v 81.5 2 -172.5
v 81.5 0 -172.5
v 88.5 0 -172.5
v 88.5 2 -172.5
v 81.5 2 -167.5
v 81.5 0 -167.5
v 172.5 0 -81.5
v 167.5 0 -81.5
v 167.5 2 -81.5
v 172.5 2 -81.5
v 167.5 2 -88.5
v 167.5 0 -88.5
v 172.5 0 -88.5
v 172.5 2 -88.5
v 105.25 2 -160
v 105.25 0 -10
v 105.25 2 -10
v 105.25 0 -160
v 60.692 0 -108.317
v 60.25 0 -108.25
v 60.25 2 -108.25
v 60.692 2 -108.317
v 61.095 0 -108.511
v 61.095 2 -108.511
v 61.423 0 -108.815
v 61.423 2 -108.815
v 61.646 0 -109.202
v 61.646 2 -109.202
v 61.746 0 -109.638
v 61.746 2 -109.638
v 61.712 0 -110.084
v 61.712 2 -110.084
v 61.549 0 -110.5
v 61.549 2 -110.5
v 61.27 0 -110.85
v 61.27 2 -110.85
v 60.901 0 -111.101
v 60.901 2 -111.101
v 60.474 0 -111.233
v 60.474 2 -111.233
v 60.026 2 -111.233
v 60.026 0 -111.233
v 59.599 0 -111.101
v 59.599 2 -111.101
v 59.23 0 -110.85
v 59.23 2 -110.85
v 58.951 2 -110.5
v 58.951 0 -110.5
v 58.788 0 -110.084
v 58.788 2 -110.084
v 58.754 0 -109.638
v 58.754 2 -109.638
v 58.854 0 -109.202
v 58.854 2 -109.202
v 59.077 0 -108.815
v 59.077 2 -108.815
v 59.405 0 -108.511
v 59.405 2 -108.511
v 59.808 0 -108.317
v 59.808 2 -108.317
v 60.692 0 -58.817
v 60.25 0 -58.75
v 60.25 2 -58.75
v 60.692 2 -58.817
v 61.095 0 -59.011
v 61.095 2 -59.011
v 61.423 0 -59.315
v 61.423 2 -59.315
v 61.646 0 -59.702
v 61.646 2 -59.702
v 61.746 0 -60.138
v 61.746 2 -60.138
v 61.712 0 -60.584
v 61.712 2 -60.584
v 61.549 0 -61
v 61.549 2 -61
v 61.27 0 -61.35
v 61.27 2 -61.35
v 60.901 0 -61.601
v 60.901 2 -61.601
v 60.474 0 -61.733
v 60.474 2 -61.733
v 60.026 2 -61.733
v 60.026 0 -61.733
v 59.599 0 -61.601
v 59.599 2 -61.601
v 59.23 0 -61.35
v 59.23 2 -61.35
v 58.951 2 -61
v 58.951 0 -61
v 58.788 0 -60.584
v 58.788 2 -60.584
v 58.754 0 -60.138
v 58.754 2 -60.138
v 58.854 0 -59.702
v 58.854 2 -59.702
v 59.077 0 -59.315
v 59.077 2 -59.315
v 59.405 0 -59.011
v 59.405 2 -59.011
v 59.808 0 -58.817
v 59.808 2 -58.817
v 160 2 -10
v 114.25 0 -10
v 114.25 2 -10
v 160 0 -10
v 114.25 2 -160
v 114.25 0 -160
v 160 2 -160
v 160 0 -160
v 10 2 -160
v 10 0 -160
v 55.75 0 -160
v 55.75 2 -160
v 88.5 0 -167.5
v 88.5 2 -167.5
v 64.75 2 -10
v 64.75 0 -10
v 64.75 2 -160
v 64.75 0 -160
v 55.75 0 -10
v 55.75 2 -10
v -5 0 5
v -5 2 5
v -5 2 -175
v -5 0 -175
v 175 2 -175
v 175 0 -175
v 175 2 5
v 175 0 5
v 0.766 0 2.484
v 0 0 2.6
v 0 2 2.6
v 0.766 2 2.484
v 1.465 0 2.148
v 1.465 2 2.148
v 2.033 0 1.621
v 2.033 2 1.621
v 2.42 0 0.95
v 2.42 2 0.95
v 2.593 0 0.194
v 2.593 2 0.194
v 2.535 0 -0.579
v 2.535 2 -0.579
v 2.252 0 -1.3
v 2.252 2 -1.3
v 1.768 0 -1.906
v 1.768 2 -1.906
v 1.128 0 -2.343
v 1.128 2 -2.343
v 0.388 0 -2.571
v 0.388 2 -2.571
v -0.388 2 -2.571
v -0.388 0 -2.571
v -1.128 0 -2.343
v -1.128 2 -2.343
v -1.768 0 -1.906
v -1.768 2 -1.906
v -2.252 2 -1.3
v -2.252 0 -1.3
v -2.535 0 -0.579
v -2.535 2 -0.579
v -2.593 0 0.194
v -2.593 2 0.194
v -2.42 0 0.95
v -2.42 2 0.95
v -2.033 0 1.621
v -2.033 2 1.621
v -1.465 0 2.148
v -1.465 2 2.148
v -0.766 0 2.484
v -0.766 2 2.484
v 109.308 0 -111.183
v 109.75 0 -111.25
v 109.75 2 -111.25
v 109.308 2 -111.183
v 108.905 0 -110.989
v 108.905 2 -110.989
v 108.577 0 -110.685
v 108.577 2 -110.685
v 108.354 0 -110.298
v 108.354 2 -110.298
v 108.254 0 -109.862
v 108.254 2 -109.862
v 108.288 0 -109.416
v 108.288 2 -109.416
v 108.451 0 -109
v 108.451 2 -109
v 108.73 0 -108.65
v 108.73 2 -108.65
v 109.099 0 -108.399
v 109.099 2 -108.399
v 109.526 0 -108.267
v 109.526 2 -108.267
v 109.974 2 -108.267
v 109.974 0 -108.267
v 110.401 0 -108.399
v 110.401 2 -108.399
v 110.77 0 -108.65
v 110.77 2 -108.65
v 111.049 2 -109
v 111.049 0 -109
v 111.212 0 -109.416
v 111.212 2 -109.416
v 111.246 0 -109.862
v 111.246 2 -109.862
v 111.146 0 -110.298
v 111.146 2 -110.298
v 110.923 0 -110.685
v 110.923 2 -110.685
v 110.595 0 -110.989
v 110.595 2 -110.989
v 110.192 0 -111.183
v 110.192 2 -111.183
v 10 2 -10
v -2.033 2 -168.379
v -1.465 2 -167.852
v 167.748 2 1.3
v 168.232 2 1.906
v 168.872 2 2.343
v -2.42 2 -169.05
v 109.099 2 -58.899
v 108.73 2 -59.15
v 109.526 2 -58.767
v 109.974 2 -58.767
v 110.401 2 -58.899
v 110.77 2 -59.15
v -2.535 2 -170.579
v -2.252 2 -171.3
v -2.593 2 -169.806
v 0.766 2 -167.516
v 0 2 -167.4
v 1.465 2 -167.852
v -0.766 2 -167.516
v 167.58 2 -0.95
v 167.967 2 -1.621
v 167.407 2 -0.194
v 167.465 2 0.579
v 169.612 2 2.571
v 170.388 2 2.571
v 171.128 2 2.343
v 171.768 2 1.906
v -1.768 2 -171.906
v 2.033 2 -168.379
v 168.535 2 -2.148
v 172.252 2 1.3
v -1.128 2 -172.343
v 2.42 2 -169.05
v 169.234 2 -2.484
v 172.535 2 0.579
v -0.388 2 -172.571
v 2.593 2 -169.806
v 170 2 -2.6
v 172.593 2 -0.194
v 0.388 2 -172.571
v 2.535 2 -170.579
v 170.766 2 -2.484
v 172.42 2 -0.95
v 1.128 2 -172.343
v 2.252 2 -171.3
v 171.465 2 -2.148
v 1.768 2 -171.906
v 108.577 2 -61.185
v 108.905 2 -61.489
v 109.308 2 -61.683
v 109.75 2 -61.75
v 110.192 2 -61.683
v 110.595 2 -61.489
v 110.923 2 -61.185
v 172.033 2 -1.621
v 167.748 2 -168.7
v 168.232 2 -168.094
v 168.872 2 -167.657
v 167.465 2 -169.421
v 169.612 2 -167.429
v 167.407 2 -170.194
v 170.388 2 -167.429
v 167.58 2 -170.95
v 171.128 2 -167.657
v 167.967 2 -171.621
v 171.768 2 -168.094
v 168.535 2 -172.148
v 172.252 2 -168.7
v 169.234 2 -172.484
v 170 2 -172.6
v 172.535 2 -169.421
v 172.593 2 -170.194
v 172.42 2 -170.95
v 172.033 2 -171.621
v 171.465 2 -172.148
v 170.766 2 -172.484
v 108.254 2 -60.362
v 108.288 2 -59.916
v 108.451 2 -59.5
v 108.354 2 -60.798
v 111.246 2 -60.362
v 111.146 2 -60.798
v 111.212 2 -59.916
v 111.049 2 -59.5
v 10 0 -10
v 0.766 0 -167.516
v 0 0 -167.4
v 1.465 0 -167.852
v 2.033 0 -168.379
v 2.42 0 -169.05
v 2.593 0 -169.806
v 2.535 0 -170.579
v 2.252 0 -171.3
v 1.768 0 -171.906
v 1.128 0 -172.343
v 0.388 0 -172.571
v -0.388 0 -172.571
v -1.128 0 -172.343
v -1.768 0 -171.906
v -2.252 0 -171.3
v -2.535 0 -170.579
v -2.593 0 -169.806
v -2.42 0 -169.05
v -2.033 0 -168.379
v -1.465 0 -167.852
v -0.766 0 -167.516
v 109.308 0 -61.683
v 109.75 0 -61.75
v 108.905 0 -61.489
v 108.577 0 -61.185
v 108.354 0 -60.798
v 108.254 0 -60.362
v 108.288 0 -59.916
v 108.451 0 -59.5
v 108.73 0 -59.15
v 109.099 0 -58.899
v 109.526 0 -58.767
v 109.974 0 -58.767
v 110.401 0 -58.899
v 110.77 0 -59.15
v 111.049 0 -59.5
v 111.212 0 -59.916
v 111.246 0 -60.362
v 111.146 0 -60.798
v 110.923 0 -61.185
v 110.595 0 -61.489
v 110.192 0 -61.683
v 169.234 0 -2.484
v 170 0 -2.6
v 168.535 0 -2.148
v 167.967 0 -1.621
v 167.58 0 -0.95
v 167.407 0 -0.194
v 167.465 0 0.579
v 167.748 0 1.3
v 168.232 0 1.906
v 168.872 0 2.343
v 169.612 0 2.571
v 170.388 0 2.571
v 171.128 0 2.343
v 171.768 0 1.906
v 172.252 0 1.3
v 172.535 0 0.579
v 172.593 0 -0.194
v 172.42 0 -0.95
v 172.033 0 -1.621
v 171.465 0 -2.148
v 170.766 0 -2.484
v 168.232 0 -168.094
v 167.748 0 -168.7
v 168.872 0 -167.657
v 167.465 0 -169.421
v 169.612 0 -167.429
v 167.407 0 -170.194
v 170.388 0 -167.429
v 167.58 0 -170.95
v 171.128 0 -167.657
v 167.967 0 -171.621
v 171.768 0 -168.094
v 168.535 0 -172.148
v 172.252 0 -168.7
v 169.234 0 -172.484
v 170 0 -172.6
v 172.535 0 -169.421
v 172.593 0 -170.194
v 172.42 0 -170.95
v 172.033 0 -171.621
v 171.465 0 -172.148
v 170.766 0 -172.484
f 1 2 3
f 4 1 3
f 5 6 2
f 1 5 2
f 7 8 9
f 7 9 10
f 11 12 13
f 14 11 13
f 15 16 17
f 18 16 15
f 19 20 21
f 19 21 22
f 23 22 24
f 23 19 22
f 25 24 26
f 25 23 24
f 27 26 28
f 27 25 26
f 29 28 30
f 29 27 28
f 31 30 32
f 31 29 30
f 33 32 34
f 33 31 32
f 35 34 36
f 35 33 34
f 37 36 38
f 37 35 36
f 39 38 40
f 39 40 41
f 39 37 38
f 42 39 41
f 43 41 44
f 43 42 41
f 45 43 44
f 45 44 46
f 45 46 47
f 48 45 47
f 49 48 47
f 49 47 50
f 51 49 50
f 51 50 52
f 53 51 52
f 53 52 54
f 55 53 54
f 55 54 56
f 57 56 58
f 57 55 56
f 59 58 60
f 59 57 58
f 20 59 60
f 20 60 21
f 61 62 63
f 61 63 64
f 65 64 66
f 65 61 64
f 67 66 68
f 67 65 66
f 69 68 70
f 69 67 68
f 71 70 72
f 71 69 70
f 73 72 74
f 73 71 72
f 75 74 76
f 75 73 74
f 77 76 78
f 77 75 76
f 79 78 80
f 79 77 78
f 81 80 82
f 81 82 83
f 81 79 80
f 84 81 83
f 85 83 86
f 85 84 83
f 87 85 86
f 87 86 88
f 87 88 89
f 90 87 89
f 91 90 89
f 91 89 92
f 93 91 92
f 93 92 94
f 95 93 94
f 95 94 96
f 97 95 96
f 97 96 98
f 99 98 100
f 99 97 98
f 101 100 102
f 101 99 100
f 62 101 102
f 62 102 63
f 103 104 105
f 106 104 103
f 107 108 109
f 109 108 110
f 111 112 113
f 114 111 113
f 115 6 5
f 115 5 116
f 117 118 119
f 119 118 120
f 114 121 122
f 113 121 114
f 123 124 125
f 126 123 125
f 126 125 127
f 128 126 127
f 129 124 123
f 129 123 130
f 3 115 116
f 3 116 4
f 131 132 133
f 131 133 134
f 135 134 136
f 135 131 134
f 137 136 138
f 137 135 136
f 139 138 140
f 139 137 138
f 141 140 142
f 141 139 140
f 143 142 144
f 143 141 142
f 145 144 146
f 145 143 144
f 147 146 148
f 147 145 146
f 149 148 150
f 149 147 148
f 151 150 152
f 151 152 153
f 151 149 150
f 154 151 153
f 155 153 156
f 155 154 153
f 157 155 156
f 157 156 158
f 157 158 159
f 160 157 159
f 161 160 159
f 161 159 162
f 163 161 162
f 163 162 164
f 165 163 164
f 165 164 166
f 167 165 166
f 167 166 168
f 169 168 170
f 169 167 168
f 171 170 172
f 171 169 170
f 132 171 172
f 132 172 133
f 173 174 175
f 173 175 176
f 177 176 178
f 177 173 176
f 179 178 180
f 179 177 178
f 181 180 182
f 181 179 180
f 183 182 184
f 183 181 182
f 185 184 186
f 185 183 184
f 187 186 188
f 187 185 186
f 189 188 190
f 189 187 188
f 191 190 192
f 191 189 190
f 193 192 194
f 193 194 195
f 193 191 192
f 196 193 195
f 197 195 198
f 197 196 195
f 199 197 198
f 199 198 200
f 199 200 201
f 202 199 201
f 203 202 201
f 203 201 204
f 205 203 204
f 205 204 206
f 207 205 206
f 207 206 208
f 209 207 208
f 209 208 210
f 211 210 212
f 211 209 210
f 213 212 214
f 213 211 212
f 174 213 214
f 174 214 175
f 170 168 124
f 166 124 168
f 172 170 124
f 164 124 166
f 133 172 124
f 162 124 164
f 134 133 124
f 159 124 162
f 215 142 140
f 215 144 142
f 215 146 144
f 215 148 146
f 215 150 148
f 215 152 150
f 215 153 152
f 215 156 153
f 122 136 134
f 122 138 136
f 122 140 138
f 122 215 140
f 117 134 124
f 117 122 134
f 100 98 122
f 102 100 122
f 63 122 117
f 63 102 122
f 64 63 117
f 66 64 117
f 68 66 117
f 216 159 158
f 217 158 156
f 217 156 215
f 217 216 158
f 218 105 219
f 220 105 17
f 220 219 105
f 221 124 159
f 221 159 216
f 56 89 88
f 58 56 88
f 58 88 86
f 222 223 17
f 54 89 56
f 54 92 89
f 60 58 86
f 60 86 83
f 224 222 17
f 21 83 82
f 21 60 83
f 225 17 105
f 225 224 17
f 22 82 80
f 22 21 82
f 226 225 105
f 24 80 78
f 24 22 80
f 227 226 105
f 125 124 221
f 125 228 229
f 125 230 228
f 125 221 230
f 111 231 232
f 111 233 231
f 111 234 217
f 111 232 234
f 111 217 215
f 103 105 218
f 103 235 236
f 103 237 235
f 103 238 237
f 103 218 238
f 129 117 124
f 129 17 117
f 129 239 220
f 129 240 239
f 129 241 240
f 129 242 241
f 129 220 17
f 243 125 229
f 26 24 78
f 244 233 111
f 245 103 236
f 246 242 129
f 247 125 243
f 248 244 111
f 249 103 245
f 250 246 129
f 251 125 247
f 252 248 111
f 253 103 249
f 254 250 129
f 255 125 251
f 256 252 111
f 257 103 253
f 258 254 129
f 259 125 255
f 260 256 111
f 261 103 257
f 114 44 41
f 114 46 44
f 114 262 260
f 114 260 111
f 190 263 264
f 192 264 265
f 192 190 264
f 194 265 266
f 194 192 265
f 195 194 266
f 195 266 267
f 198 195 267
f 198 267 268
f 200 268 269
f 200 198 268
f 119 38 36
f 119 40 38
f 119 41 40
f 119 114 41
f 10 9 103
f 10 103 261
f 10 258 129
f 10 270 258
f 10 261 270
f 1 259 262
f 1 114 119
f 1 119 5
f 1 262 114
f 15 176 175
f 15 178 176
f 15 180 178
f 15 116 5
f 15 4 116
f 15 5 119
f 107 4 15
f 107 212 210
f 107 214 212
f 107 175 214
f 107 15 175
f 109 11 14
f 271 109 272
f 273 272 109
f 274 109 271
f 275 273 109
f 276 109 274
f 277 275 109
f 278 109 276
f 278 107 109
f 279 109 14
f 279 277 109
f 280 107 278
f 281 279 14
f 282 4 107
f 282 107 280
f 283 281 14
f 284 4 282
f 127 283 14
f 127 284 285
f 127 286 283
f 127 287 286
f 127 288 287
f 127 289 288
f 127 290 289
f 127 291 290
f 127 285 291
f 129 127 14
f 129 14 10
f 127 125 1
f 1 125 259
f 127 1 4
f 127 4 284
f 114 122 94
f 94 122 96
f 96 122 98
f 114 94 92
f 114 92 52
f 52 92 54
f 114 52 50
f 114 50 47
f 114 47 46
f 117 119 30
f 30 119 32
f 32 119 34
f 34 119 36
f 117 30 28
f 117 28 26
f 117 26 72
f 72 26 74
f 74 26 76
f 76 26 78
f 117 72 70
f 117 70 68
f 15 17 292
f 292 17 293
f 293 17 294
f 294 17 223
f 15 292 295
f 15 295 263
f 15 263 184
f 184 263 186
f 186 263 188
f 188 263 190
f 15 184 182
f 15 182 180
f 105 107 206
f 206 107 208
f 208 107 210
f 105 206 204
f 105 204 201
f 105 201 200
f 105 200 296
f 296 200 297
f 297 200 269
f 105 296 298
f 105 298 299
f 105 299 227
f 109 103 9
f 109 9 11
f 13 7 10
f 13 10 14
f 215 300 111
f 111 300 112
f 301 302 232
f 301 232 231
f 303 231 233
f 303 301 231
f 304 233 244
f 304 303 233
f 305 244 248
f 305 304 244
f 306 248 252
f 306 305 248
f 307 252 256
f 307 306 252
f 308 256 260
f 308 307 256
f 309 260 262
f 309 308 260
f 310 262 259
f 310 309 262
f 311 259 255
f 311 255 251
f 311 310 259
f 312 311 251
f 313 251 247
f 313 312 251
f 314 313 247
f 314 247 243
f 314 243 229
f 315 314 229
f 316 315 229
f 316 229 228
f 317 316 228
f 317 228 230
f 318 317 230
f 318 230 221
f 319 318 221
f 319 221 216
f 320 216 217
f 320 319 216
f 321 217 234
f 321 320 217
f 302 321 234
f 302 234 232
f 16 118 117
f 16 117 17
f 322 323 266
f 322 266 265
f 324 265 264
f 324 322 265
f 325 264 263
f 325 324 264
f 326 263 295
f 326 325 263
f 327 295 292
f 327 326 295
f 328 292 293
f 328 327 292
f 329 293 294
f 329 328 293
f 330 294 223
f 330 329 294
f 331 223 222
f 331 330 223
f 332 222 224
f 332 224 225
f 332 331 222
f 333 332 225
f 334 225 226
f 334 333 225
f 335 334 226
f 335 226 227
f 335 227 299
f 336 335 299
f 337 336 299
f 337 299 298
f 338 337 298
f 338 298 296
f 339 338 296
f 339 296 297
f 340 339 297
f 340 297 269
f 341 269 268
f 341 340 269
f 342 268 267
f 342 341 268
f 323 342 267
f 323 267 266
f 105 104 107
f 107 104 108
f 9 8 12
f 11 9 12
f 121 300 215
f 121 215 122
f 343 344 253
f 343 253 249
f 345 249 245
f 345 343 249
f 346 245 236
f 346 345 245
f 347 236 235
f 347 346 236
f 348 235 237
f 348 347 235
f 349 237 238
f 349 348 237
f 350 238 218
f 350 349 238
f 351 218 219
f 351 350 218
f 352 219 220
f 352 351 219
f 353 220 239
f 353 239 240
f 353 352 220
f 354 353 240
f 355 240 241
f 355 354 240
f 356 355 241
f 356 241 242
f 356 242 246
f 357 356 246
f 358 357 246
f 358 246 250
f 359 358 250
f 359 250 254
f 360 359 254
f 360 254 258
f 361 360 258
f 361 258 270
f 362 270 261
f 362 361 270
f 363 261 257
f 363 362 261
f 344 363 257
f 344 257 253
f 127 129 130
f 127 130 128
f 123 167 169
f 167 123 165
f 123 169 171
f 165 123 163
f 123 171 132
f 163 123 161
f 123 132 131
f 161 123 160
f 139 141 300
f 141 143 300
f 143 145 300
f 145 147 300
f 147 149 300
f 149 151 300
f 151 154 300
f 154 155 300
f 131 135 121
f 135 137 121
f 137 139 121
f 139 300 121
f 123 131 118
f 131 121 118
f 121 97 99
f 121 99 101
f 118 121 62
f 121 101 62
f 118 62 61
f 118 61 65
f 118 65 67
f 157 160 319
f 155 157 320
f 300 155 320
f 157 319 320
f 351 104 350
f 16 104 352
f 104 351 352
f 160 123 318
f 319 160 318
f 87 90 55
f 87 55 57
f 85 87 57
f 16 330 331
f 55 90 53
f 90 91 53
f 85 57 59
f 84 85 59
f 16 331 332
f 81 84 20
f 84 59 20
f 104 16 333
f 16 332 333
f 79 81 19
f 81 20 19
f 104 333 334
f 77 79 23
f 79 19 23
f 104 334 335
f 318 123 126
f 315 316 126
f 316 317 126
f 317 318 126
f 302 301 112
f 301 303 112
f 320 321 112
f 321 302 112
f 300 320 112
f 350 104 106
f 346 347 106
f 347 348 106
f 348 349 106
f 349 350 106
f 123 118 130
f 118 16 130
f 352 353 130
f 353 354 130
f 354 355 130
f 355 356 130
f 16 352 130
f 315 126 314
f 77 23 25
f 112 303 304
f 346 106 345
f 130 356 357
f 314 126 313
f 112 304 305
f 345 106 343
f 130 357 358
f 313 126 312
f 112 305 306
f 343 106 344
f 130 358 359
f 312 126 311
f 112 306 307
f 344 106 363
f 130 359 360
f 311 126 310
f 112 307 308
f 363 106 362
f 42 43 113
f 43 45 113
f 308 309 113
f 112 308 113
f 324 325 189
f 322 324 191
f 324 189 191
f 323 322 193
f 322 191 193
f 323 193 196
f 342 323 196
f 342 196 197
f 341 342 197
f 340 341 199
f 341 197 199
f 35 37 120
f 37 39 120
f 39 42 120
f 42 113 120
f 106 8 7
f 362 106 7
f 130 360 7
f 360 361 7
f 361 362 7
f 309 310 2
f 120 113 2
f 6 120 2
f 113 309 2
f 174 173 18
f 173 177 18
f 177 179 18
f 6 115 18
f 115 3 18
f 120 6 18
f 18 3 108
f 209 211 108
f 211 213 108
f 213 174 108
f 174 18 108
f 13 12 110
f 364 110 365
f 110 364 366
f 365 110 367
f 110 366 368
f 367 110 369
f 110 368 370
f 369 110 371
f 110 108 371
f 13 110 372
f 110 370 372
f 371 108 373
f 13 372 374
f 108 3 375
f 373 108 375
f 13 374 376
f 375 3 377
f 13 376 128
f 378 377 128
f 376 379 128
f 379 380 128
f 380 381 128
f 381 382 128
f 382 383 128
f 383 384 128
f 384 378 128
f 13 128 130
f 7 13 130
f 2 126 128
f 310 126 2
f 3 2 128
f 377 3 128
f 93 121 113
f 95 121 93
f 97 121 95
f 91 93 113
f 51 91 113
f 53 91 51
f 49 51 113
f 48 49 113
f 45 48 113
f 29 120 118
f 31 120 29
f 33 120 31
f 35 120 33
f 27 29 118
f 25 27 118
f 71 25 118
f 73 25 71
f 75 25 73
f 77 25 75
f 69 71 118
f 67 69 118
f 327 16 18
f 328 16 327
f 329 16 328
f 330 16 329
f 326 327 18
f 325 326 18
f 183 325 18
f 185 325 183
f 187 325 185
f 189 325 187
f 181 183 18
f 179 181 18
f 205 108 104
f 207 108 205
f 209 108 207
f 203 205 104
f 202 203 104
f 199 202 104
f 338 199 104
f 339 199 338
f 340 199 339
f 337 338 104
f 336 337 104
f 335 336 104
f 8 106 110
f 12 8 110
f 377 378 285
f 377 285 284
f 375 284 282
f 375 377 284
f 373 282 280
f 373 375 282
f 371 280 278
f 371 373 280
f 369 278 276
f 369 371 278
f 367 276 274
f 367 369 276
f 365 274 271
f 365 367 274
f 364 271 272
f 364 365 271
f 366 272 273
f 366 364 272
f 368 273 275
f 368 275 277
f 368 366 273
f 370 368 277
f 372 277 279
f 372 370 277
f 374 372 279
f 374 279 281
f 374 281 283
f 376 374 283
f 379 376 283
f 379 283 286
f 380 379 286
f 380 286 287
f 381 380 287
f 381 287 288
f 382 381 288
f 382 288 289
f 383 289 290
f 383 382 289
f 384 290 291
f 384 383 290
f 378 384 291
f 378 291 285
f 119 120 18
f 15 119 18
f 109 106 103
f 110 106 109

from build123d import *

# Parameters (mm, degrees)
CROQUIS1_W              = 190
CROQUIS1_H              = 190
CROQUIS1_R              = 1.5
CROQUIS1_R_2            = 2.6
CROQUIS1_W_2            = 45.75
CROQUIS1_H_2            = 150
CROQUIS1_W_3            = 40.5
CROQUIS1_W_4            = 5
CROQUIS1_H_3            = 7
CROQUIS1_W_5            = 7
CROQUIS1_H_4            = 5
SALIENTE_EXTRUIR1_DEPTH = 2
CROQUIS2_W              = 190
CROQUIS2_H              = 190
CROQUIS2_W_2            = 180
CROQUIS2_H_2            = 180
CORTAR_EXTRUIR1_DEPTH   = 74


with BuildPart() as part:
    # Croquis1 → Saliente-Extruir1 (new body)
    with BuildSketch(Plane(origin=(0, 0, 0), x_dir=(1, 0, 0), z_dir=(0, 1, 0))):
        with Locations((85, 85)):
            Rectangle(CROQUIS1_W, CROQUIS1_H)
        with Locations(Location((60.25, 109.75, 0), (0, 0, 270))):
            Circle(CROQUIS1_R, mode=Mode.SUBTRACT)
        with Locations(Location((60.25, 60.25, 0), (0, 0, 270))):
            Circle(CROQUIS1_R, mode=Mode.SUBTRACT)
        with Locations(Location((0, 170, 0), (0, 0, 270))):
            Circle(CROQUIS1_R_2, mode=Mode.SUBTRACT)
        with Locations(Location((0, 0, 0), (0, 0, 270))):
            Circle(CROQUIS1_R_2, mode=Mode.SUBTRACT)
        with Locations(Location((109.75, 109.75, 0), (0, 0, 90))):
            Circle(CROQUIS1_R, mode=Mode.SUBTRACT)
        with Locations(Location((109.75, 60.25, 0), (0, 0, 90))):
            Circle(CROQUIS1_R, mode=Mode.SUBTRACT)
        with Locations(Location((170, 0, 0), (0, 0, 90))):
            Circle(CROQUIS1_R_2, mode=Mode.SUBTRACT)
        with Locations(Location((170, 170, 0), (0, 0, 90))):
            Circle(CROQUIS1_R_2, mode=Mode.SUBTRACT)
        with Locations((32.875, 85)):
            Rectangle(CROQUIS1_W_2, CROQUIS1_H_2, mode=Mode.SUBTRACT)
        with Locations((137.125, 85)):
            Rectangle(CROQUIS1_W_2, CROQUIS1_H_2, mode=Mode.SUBTRACT)
        with Locations((85, 85)):
            Rectangle(CROQUIS1_W_3, CROQUIS1_H_2, mode=Mode.SUBTRACT)
        with Locations((170, 85)):
            Rectangle(CROQUIS1_W_4, CROQUIS1_H_3, mode=Mode.SUBTRACT)
        with Locations((85, 170)):
            Rectangle(CROQUIS1_W_5, CROQUIS1_H_4, mode=Mode.SUBTRACT)
    extrude(amount=SALIENTE_EXTRUIR1_DEPTH)

    # Croquis2 → Cortar-Extruir1 (cut)
    with BuildSketch(Plane(origin=(0, 2, 0), x_dir=(1, 0, 0), z_dir=(0, 1, 0))):
        with Locations((85, 85)):
            Rectangle(CROQUIS2_W, CROQUIS2_H)
        with Locations((85, 85)):
            Rectangle(CROQUIS2_W_2, CROQUIS2_H_2, mode=Mode.SUBTRACT)
    extrude(amount=-CORTAR_EXTRUIR1_DEPTH, mode=Mode.SUBTRACT)


solid = part.part
